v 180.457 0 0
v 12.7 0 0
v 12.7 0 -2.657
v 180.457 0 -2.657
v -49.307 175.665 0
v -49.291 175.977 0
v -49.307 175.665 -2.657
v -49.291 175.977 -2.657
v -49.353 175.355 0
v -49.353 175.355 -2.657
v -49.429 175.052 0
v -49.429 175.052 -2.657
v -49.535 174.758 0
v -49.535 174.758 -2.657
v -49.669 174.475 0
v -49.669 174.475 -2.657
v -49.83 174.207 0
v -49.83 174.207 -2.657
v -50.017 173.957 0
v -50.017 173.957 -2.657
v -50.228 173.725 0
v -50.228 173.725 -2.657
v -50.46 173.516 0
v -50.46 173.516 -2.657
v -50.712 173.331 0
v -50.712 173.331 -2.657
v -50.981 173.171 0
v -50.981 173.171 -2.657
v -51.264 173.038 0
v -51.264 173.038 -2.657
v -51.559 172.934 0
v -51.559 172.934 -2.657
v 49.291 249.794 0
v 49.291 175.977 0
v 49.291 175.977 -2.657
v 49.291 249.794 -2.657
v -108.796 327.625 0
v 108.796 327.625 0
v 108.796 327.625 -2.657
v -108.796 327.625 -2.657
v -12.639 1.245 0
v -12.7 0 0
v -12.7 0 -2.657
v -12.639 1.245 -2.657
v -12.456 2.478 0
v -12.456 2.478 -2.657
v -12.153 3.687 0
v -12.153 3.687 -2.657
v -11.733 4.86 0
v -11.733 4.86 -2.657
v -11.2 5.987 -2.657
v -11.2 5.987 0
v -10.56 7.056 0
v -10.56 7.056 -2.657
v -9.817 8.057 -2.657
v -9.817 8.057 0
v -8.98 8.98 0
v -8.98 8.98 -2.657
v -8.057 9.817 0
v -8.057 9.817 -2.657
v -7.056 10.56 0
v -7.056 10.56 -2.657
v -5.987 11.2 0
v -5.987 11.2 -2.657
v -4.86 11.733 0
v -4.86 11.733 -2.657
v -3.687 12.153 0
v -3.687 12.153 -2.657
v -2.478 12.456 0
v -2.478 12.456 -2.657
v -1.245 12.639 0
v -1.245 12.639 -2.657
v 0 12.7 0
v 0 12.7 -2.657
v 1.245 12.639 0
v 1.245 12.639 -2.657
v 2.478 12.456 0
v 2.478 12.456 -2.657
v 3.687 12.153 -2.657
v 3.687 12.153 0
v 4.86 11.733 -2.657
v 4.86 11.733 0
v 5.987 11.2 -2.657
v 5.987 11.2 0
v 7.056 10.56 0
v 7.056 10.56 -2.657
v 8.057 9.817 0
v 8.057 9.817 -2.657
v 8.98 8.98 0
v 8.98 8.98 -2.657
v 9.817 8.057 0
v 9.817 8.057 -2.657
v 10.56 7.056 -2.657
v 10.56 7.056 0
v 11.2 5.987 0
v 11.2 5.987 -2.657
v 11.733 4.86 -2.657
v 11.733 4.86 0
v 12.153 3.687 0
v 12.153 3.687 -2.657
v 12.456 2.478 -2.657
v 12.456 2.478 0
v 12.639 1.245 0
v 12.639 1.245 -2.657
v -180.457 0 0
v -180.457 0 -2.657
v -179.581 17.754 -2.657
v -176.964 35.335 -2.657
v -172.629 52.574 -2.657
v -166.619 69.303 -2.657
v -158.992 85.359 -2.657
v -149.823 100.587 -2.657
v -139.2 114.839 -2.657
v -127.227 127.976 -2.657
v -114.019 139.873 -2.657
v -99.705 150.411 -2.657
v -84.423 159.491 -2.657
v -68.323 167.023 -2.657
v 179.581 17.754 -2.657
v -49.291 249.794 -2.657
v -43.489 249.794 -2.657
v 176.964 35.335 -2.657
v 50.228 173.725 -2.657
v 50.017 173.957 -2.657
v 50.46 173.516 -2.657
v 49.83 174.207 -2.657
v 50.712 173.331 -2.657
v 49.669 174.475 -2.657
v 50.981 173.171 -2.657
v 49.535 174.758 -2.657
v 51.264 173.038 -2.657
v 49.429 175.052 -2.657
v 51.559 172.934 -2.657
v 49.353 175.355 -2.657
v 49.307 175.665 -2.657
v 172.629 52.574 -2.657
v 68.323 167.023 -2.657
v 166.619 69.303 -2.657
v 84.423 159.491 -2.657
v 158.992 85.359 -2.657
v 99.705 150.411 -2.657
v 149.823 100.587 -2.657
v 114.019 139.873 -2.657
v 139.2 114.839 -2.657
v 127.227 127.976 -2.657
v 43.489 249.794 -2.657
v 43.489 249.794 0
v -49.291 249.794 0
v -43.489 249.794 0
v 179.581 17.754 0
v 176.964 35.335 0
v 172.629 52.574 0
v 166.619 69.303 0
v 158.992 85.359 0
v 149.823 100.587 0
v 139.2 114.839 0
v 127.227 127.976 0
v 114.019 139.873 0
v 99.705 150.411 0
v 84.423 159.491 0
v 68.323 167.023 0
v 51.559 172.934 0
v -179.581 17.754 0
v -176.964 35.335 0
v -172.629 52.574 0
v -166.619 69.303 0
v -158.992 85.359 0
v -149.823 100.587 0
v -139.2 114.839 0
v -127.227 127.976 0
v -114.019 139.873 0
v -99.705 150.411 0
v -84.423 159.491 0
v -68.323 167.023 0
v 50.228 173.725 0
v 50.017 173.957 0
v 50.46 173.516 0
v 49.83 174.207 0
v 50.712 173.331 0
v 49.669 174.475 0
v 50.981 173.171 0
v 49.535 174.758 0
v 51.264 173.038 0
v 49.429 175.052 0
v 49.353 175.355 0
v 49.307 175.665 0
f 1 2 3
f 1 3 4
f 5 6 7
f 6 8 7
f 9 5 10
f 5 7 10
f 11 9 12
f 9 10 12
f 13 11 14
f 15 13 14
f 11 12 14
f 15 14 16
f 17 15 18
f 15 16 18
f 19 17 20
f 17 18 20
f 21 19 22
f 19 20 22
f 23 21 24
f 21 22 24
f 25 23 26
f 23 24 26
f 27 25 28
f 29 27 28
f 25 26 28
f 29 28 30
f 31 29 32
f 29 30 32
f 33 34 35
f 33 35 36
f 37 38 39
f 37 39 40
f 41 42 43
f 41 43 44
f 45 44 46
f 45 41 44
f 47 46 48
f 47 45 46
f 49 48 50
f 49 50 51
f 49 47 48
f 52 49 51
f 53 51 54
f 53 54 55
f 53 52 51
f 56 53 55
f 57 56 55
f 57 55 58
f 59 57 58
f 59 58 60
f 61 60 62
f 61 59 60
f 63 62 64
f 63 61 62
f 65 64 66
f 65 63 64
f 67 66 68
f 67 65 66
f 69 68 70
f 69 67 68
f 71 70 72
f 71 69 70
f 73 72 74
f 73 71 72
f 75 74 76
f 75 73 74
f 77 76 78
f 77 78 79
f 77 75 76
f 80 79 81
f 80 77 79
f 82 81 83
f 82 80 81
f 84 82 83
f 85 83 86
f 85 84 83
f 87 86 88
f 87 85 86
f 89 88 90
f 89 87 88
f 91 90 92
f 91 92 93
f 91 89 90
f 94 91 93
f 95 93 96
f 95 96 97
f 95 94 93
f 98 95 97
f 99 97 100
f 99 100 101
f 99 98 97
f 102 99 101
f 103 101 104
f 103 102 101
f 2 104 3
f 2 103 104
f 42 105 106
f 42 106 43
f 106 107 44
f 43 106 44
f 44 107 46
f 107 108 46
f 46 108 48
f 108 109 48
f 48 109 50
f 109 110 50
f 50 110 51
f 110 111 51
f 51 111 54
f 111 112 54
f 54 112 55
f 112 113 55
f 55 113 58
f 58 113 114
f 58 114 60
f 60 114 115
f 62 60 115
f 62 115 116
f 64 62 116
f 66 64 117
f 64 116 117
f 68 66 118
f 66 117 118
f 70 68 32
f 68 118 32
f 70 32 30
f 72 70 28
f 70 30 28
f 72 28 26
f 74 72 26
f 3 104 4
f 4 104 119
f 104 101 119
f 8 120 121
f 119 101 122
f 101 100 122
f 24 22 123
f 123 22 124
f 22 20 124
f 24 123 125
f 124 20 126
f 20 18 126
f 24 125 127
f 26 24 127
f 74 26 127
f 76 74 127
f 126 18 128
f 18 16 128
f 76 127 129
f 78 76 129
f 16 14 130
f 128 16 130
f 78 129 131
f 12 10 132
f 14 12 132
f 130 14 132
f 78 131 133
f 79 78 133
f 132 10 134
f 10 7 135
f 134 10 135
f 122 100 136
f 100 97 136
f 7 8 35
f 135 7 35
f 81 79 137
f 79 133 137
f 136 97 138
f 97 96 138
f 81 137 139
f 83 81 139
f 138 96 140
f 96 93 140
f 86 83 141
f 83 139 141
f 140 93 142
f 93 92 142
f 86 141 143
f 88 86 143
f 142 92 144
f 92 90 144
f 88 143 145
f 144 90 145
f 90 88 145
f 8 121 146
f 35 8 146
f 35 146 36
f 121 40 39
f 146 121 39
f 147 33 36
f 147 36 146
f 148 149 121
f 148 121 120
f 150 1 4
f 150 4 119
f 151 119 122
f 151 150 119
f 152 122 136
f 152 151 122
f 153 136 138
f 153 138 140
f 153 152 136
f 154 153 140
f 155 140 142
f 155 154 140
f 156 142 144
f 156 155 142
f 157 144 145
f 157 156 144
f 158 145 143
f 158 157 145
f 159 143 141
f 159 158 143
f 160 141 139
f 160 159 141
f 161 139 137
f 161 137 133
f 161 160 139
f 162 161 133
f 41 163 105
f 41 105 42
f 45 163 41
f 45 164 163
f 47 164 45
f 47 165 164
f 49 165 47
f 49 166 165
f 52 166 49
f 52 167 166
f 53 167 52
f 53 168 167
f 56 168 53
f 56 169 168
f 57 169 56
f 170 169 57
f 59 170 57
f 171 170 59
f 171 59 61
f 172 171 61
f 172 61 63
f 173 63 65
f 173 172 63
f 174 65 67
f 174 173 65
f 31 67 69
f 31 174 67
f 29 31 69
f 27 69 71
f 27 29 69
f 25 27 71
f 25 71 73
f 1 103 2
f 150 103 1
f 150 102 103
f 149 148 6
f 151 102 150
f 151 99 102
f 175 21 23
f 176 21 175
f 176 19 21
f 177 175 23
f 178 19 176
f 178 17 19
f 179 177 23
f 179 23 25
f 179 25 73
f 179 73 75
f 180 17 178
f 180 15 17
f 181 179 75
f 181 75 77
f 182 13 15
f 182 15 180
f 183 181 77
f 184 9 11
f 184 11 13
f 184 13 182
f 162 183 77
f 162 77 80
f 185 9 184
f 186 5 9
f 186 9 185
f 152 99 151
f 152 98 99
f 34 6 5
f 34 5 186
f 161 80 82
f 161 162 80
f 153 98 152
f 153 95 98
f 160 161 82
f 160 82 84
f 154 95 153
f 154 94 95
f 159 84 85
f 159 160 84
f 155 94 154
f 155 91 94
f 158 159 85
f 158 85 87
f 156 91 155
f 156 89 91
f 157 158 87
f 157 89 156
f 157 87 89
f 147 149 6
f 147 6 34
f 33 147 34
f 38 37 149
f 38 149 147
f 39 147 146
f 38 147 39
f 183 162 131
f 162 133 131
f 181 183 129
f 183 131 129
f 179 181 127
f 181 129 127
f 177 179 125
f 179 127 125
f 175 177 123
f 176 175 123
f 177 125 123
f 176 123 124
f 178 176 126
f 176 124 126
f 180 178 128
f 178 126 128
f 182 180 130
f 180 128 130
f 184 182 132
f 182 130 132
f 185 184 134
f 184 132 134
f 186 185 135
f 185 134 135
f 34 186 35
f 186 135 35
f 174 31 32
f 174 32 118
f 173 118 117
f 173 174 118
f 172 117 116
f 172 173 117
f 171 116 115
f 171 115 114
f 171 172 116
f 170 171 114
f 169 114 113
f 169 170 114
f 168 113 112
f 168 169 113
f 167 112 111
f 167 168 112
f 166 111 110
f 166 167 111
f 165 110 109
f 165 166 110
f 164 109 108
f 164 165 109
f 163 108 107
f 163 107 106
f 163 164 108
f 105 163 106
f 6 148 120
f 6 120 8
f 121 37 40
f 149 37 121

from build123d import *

# Parameters (mm, degrees)
BASE_FLANGE1_DEPTH = 2.65684
FILLET1_R          = 3.175


# Sheet-metal steps are written as plain solids
with BuildPart() as part:
    # Sketch1 → Base-Flange1 (new body)
    with BuildSketch(Plane.XY):
        with BuildLine():
            Line((-180.45684, 0), (-12.7, 0))
            ThreePointArc((-12.7, 0), (0, 12.7), (12.7, 0))
            Line((12.7, 0), (180.45684, 0))
            ThreePointArc((180.45684, 0), (143.97849234, 108.788165011), (49.29124, 173.594483674))
            Line((49.29124, 173.594483674), (49.29124, 249.794483674))
            Line((49.29124, 249.794483674), (43.488704599, 249.794483674))
            Line((43.488704599, 249.794483674), (108.795925743, 327.624599095))
            Line((108.795925743, 327.624599095), (-108.795925743, 327.624599095))
            Line((-108.795925743, 327.624599095), (-43.488704599, 249.794483674))
            Line((-43.488704599, 249.794483674), (-49.29124, 249.794483674))
            Line((-49.29124, 249.794483674), (-49.29124, 173.594483674))
            ThreePointArc((-49.29124, 173.594483674), (-143.97849234, 108.788165011), (-180.45684, 0))
        make_face()
    extrude(amount=-BASE_FLANGE1_DEPTH)

    # Fillet1
    fillet1_edges = [part.edges().sort_by_distance(p)[0] for p in [
        (-49.29124, 173.594483674, -1.32842),
        (49.29124, 173.594483674, -1.32842),
    ]]
    fillet(fillet1_edges, radius=FILLET1_R)


solid = part.part
